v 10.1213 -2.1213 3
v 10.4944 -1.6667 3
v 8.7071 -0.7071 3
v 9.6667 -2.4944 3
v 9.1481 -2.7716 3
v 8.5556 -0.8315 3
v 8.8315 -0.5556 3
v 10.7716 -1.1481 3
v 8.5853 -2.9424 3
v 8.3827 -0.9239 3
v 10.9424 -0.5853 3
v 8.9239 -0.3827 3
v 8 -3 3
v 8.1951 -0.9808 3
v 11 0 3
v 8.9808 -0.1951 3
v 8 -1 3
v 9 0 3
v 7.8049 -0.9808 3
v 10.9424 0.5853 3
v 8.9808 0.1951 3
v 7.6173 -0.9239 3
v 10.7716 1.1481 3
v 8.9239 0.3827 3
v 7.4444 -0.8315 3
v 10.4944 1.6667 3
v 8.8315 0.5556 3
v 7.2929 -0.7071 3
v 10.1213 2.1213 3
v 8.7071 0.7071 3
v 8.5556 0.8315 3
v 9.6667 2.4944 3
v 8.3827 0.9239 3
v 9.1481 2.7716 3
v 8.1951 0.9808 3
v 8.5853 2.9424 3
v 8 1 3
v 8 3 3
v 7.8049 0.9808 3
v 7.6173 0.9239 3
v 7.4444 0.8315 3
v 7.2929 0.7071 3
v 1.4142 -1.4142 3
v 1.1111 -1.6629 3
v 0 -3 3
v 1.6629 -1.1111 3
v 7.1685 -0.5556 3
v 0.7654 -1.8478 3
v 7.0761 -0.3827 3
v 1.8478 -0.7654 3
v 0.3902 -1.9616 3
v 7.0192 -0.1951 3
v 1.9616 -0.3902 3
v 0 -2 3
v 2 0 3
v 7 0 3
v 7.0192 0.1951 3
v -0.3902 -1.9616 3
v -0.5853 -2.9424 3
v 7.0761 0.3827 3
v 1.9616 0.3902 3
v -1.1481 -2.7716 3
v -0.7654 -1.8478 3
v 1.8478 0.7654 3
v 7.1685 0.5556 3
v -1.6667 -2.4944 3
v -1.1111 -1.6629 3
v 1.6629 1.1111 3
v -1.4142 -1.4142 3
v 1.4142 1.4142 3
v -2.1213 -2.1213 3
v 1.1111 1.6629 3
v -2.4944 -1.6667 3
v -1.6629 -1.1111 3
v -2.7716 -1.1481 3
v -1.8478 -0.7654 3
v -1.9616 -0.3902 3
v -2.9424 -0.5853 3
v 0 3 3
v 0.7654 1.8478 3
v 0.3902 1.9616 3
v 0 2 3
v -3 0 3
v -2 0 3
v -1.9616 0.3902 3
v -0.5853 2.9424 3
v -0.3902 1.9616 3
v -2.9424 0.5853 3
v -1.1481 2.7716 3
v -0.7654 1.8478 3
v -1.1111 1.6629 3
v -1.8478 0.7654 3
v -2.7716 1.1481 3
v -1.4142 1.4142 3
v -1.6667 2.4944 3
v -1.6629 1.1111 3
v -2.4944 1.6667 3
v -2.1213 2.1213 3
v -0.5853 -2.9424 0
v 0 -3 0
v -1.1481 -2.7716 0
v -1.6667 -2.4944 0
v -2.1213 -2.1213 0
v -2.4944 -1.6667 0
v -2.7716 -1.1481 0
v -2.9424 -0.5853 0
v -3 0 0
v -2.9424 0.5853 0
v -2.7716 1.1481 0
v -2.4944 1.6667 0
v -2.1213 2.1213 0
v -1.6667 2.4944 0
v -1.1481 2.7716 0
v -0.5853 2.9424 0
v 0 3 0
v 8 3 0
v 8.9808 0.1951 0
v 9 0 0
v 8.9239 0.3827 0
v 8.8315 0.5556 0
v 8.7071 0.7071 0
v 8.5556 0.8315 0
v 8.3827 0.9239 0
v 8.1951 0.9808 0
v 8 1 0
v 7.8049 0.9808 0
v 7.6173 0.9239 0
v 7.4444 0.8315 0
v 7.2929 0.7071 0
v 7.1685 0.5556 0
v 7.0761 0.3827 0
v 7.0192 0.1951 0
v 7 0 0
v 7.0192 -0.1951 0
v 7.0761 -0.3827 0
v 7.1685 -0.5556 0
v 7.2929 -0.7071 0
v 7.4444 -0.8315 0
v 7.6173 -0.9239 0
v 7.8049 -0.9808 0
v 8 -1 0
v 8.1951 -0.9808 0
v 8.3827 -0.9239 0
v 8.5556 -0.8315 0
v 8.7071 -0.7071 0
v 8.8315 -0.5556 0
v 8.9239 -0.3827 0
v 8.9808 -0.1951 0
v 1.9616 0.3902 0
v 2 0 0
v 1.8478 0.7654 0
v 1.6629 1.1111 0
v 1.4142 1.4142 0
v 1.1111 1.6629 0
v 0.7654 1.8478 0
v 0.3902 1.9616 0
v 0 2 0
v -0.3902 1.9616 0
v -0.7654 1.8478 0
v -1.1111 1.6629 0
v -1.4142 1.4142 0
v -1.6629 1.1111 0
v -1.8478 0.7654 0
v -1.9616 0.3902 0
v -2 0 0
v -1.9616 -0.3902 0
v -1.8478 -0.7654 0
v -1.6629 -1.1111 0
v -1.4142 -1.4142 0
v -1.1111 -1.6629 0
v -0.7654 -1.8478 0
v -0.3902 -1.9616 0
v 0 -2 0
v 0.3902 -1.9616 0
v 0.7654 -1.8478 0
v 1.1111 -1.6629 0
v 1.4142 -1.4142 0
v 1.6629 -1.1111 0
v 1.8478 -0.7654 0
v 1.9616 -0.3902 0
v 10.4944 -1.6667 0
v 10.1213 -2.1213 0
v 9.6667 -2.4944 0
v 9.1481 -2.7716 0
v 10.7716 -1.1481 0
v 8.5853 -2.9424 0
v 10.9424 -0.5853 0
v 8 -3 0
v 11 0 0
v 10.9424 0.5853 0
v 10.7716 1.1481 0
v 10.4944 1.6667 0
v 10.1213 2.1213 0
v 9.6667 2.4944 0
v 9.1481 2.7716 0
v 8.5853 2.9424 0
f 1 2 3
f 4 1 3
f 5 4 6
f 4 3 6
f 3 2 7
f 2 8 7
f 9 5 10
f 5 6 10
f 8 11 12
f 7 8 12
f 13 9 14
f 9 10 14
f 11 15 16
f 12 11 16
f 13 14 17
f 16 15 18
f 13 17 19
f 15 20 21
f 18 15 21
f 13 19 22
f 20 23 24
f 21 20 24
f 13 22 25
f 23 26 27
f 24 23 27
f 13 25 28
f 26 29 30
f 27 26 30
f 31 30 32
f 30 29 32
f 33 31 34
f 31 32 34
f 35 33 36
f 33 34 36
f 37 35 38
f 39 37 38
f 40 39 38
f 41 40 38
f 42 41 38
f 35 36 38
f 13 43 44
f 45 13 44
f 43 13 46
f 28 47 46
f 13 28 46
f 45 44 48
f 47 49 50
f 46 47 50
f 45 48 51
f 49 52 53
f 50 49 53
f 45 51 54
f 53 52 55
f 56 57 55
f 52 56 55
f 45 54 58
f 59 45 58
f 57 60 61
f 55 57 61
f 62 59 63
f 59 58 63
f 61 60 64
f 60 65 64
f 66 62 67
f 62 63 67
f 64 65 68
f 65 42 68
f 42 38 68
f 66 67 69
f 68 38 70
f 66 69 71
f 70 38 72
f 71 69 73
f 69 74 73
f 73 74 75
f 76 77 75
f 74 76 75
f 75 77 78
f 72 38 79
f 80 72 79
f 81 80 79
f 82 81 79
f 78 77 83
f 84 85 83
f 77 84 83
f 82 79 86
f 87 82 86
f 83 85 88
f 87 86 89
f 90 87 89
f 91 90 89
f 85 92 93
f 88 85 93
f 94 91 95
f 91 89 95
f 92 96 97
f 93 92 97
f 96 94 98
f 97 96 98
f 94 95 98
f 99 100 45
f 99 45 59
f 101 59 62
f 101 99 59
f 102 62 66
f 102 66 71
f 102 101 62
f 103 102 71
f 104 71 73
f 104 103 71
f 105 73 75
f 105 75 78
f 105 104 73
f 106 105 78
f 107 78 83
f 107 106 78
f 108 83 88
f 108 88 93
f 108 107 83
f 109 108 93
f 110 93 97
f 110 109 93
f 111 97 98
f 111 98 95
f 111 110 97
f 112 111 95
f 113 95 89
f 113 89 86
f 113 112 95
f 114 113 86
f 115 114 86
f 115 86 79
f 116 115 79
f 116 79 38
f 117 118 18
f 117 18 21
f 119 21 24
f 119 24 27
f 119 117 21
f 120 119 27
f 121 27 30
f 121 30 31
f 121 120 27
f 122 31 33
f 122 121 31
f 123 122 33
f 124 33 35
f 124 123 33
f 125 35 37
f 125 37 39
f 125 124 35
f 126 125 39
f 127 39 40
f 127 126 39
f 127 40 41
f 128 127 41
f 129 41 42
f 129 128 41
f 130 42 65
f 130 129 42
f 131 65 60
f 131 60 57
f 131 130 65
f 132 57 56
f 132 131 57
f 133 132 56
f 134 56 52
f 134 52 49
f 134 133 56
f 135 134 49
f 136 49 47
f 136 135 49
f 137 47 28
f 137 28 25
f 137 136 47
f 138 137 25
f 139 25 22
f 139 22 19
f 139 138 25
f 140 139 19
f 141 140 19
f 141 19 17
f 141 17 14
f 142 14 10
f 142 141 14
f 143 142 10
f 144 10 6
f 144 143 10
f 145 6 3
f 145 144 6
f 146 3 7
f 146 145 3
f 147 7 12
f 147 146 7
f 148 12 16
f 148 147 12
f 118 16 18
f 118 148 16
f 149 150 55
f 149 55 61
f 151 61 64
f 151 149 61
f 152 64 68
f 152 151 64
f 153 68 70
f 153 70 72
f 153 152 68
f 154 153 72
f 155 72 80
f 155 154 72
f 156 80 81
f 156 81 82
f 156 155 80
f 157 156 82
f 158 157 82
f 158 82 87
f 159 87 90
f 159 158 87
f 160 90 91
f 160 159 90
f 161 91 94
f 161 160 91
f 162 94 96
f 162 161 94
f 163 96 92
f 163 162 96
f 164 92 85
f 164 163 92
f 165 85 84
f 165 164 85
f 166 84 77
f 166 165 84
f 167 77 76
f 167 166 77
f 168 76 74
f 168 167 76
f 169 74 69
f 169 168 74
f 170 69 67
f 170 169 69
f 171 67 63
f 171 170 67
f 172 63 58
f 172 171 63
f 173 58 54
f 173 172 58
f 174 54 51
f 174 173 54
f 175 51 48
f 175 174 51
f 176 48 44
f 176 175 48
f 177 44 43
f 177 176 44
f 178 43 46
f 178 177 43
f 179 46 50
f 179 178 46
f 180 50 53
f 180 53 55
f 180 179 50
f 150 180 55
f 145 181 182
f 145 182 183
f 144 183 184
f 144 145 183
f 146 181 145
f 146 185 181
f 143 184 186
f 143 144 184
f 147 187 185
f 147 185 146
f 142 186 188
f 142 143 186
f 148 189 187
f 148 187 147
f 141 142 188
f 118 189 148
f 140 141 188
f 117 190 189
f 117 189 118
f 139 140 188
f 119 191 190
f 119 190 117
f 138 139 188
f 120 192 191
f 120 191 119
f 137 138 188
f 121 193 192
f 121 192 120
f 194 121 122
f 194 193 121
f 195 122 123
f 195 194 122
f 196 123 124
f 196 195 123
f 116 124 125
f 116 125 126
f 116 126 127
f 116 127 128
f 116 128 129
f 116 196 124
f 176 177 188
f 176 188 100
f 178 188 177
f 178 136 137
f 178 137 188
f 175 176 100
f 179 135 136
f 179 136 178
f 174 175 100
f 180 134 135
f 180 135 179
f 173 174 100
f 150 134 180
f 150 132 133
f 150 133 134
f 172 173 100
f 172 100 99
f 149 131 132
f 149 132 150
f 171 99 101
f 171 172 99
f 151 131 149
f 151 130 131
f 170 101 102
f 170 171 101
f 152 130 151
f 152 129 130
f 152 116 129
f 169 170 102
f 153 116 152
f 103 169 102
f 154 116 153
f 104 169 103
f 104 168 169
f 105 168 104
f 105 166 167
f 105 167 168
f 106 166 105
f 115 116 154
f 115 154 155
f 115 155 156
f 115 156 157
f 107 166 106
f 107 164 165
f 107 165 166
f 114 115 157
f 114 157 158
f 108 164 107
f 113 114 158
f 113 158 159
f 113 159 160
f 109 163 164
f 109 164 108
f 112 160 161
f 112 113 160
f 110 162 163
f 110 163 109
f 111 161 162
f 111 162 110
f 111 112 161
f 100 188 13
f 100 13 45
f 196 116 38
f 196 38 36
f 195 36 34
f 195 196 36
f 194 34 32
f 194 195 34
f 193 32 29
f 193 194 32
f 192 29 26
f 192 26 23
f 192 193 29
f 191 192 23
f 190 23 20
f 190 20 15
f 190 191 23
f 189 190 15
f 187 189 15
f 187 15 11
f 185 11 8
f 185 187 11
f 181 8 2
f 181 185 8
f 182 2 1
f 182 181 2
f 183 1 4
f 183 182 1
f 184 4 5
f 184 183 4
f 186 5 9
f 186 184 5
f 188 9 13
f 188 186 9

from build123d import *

# Parameters (mm, degrees)
SKETCH_1_R      = 2
SKETCH_1_R_2    = 1
EXTRUDE_1_DEPTH = 3


with BuildPart() as part:
    # Эскиз1 → Бобышка-Вытянуть1 (new body)
    with BuildSketch(Plane.XY):
        with BuildLine():
            Line((0, 3), (8, 3))
            ThreePointArc((8, 3), (10.121320344, 2.121320344), (11, 0))
            ThreePointArc((11, 0), (10.121320344, -2.121320344), (8, -3))
            Line((8, -3), (0, -3))
            ThreePointArc((0, -3), (-3, 0), (0, 3))
        make_face()
        Circle(SKETCH_1_R, mode=Mode.SUBTRACT)
        with Locations((8, 0)):
            Circle(SKETCH_1_R_2, mode=Mode.SUBTRACT)
    extrude(amount=EXTRUDE_1_DEPTH)


solid = part.part
